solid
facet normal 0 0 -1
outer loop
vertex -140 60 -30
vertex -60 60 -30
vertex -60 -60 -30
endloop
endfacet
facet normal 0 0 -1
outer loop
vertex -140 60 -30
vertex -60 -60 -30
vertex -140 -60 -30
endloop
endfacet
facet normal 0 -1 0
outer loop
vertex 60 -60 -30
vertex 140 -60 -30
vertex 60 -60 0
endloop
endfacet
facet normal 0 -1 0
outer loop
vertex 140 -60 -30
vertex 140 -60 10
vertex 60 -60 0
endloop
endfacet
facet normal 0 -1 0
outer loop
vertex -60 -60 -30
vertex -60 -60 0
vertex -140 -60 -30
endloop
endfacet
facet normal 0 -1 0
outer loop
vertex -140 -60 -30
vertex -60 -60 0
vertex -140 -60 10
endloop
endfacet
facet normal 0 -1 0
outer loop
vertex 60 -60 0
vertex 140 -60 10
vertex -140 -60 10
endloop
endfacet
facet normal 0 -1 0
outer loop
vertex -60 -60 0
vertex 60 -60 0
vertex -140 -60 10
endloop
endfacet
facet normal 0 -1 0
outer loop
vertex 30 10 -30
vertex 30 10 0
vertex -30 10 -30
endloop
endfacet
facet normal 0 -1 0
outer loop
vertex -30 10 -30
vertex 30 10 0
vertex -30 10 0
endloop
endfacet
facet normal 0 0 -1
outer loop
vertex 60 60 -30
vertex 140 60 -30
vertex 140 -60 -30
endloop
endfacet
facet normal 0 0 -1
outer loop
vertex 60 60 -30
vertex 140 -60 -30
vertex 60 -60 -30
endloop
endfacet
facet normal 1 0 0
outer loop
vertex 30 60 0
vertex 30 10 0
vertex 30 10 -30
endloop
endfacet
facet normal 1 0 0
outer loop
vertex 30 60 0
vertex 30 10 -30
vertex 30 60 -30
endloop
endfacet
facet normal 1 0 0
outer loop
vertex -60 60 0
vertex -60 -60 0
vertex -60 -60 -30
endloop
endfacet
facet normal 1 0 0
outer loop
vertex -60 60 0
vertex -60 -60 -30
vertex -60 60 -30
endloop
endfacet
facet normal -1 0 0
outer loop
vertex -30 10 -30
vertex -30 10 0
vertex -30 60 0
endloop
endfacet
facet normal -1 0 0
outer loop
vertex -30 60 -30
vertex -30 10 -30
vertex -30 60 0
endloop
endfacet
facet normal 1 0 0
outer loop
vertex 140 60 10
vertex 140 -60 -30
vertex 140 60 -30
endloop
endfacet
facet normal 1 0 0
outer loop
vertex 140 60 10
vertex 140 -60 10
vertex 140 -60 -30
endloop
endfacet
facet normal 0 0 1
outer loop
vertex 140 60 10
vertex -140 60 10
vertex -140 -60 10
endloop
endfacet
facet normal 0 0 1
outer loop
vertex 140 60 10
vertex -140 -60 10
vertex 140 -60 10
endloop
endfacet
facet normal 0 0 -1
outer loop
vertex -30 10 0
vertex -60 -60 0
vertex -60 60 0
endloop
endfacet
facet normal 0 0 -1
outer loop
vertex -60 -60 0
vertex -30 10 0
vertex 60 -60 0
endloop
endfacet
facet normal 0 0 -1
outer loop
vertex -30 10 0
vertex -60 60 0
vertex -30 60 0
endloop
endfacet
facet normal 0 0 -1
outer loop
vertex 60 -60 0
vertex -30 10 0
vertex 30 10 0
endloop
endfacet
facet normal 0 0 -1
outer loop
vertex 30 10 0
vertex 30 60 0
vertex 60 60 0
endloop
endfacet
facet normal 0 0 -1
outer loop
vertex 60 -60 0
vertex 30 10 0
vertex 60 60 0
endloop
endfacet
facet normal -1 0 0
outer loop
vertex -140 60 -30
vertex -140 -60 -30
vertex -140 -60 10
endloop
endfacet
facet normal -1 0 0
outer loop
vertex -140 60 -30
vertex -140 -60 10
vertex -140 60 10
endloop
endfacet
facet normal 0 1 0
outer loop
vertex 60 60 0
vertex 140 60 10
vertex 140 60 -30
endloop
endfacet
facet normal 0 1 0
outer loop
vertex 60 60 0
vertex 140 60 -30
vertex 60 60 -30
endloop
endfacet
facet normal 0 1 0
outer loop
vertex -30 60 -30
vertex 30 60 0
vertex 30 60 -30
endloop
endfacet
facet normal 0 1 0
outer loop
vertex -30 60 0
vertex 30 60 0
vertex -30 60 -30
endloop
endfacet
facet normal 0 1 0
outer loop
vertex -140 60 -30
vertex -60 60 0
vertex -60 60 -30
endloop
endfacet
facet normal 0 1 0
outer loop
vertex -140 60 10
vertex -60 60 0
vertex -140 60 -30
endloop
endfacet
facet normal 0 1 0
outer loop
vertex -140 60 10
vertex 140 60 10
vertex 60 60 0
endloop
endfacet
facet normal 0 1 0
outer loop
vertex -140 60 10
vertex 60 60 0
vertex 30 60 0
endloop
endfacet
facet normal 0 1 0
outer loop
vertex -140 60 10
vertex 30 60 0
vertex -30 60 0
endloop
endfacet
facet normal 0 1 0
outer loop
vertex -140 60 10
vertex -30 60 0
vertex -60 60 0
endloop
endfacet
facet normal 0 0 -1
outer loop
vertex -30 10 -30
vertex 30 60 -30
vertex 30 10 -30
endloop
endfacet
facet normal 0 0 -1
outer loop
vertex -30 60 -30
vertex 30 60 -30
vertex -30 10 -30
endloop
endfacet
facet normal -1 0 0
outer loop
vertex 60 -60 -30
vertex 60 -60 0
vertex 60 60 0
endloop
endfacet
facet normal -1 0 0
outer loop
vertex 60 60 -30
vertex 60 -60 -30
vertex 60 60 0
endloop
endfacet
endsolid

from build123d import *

# Parameters (mm, degrees)
SKETCH_1_W      = 280
SKETCH_1_H      = 120
EXTRUDE_1_DEPTH = 10
SKETCH_2_W      = 60
SKETCH_2_H      = 50
EXTRUDE_2_DEPTH = 30
SKETCH_3_W      = 80
SKETCH_3_H      = 120
EXTRUDE_3_DEPTH = 30


with BuildPart() as part:
    # 스케치1 → 보스-돌출1 (new body)
    with BuildSketch(Plane.XY):
        Rectangle(SKETCH_1_W, SKETCH_1_H)
    extrude(amount=EXTRUDE_1_DEPTH)

    # 스케치2 → 보스-돌출2 (add)
    with BuildSketch(Plane(origin=(0, 0, 0), x_dir=(-1, 0, 0), z_dir=(0, 0, -1))):
        with Locations((0, 35)):
            Rectangle(SKETCH_2_W, SKETCH_2_H)
    extrude(amount=EXTRUDE_2_DEPTH)

    # 스케치3 → 보스-돌출3 (add)
    with BuildSketch(Plane(origin=(0, 0, 0), x_dir=(-1, 0, 0), z_dir=(0, 0, -1))):
        with Locations((-100, 0)):
            Rectangle(SKETCH_3_W, SKETCH_3_H)
        with Locations((100, 0)):
            Rectangle(SKETCH_3_W, SKETCH_3_H)
    extrude(amount=EXTRUDE_3_DEPTH)


solid = part.part
